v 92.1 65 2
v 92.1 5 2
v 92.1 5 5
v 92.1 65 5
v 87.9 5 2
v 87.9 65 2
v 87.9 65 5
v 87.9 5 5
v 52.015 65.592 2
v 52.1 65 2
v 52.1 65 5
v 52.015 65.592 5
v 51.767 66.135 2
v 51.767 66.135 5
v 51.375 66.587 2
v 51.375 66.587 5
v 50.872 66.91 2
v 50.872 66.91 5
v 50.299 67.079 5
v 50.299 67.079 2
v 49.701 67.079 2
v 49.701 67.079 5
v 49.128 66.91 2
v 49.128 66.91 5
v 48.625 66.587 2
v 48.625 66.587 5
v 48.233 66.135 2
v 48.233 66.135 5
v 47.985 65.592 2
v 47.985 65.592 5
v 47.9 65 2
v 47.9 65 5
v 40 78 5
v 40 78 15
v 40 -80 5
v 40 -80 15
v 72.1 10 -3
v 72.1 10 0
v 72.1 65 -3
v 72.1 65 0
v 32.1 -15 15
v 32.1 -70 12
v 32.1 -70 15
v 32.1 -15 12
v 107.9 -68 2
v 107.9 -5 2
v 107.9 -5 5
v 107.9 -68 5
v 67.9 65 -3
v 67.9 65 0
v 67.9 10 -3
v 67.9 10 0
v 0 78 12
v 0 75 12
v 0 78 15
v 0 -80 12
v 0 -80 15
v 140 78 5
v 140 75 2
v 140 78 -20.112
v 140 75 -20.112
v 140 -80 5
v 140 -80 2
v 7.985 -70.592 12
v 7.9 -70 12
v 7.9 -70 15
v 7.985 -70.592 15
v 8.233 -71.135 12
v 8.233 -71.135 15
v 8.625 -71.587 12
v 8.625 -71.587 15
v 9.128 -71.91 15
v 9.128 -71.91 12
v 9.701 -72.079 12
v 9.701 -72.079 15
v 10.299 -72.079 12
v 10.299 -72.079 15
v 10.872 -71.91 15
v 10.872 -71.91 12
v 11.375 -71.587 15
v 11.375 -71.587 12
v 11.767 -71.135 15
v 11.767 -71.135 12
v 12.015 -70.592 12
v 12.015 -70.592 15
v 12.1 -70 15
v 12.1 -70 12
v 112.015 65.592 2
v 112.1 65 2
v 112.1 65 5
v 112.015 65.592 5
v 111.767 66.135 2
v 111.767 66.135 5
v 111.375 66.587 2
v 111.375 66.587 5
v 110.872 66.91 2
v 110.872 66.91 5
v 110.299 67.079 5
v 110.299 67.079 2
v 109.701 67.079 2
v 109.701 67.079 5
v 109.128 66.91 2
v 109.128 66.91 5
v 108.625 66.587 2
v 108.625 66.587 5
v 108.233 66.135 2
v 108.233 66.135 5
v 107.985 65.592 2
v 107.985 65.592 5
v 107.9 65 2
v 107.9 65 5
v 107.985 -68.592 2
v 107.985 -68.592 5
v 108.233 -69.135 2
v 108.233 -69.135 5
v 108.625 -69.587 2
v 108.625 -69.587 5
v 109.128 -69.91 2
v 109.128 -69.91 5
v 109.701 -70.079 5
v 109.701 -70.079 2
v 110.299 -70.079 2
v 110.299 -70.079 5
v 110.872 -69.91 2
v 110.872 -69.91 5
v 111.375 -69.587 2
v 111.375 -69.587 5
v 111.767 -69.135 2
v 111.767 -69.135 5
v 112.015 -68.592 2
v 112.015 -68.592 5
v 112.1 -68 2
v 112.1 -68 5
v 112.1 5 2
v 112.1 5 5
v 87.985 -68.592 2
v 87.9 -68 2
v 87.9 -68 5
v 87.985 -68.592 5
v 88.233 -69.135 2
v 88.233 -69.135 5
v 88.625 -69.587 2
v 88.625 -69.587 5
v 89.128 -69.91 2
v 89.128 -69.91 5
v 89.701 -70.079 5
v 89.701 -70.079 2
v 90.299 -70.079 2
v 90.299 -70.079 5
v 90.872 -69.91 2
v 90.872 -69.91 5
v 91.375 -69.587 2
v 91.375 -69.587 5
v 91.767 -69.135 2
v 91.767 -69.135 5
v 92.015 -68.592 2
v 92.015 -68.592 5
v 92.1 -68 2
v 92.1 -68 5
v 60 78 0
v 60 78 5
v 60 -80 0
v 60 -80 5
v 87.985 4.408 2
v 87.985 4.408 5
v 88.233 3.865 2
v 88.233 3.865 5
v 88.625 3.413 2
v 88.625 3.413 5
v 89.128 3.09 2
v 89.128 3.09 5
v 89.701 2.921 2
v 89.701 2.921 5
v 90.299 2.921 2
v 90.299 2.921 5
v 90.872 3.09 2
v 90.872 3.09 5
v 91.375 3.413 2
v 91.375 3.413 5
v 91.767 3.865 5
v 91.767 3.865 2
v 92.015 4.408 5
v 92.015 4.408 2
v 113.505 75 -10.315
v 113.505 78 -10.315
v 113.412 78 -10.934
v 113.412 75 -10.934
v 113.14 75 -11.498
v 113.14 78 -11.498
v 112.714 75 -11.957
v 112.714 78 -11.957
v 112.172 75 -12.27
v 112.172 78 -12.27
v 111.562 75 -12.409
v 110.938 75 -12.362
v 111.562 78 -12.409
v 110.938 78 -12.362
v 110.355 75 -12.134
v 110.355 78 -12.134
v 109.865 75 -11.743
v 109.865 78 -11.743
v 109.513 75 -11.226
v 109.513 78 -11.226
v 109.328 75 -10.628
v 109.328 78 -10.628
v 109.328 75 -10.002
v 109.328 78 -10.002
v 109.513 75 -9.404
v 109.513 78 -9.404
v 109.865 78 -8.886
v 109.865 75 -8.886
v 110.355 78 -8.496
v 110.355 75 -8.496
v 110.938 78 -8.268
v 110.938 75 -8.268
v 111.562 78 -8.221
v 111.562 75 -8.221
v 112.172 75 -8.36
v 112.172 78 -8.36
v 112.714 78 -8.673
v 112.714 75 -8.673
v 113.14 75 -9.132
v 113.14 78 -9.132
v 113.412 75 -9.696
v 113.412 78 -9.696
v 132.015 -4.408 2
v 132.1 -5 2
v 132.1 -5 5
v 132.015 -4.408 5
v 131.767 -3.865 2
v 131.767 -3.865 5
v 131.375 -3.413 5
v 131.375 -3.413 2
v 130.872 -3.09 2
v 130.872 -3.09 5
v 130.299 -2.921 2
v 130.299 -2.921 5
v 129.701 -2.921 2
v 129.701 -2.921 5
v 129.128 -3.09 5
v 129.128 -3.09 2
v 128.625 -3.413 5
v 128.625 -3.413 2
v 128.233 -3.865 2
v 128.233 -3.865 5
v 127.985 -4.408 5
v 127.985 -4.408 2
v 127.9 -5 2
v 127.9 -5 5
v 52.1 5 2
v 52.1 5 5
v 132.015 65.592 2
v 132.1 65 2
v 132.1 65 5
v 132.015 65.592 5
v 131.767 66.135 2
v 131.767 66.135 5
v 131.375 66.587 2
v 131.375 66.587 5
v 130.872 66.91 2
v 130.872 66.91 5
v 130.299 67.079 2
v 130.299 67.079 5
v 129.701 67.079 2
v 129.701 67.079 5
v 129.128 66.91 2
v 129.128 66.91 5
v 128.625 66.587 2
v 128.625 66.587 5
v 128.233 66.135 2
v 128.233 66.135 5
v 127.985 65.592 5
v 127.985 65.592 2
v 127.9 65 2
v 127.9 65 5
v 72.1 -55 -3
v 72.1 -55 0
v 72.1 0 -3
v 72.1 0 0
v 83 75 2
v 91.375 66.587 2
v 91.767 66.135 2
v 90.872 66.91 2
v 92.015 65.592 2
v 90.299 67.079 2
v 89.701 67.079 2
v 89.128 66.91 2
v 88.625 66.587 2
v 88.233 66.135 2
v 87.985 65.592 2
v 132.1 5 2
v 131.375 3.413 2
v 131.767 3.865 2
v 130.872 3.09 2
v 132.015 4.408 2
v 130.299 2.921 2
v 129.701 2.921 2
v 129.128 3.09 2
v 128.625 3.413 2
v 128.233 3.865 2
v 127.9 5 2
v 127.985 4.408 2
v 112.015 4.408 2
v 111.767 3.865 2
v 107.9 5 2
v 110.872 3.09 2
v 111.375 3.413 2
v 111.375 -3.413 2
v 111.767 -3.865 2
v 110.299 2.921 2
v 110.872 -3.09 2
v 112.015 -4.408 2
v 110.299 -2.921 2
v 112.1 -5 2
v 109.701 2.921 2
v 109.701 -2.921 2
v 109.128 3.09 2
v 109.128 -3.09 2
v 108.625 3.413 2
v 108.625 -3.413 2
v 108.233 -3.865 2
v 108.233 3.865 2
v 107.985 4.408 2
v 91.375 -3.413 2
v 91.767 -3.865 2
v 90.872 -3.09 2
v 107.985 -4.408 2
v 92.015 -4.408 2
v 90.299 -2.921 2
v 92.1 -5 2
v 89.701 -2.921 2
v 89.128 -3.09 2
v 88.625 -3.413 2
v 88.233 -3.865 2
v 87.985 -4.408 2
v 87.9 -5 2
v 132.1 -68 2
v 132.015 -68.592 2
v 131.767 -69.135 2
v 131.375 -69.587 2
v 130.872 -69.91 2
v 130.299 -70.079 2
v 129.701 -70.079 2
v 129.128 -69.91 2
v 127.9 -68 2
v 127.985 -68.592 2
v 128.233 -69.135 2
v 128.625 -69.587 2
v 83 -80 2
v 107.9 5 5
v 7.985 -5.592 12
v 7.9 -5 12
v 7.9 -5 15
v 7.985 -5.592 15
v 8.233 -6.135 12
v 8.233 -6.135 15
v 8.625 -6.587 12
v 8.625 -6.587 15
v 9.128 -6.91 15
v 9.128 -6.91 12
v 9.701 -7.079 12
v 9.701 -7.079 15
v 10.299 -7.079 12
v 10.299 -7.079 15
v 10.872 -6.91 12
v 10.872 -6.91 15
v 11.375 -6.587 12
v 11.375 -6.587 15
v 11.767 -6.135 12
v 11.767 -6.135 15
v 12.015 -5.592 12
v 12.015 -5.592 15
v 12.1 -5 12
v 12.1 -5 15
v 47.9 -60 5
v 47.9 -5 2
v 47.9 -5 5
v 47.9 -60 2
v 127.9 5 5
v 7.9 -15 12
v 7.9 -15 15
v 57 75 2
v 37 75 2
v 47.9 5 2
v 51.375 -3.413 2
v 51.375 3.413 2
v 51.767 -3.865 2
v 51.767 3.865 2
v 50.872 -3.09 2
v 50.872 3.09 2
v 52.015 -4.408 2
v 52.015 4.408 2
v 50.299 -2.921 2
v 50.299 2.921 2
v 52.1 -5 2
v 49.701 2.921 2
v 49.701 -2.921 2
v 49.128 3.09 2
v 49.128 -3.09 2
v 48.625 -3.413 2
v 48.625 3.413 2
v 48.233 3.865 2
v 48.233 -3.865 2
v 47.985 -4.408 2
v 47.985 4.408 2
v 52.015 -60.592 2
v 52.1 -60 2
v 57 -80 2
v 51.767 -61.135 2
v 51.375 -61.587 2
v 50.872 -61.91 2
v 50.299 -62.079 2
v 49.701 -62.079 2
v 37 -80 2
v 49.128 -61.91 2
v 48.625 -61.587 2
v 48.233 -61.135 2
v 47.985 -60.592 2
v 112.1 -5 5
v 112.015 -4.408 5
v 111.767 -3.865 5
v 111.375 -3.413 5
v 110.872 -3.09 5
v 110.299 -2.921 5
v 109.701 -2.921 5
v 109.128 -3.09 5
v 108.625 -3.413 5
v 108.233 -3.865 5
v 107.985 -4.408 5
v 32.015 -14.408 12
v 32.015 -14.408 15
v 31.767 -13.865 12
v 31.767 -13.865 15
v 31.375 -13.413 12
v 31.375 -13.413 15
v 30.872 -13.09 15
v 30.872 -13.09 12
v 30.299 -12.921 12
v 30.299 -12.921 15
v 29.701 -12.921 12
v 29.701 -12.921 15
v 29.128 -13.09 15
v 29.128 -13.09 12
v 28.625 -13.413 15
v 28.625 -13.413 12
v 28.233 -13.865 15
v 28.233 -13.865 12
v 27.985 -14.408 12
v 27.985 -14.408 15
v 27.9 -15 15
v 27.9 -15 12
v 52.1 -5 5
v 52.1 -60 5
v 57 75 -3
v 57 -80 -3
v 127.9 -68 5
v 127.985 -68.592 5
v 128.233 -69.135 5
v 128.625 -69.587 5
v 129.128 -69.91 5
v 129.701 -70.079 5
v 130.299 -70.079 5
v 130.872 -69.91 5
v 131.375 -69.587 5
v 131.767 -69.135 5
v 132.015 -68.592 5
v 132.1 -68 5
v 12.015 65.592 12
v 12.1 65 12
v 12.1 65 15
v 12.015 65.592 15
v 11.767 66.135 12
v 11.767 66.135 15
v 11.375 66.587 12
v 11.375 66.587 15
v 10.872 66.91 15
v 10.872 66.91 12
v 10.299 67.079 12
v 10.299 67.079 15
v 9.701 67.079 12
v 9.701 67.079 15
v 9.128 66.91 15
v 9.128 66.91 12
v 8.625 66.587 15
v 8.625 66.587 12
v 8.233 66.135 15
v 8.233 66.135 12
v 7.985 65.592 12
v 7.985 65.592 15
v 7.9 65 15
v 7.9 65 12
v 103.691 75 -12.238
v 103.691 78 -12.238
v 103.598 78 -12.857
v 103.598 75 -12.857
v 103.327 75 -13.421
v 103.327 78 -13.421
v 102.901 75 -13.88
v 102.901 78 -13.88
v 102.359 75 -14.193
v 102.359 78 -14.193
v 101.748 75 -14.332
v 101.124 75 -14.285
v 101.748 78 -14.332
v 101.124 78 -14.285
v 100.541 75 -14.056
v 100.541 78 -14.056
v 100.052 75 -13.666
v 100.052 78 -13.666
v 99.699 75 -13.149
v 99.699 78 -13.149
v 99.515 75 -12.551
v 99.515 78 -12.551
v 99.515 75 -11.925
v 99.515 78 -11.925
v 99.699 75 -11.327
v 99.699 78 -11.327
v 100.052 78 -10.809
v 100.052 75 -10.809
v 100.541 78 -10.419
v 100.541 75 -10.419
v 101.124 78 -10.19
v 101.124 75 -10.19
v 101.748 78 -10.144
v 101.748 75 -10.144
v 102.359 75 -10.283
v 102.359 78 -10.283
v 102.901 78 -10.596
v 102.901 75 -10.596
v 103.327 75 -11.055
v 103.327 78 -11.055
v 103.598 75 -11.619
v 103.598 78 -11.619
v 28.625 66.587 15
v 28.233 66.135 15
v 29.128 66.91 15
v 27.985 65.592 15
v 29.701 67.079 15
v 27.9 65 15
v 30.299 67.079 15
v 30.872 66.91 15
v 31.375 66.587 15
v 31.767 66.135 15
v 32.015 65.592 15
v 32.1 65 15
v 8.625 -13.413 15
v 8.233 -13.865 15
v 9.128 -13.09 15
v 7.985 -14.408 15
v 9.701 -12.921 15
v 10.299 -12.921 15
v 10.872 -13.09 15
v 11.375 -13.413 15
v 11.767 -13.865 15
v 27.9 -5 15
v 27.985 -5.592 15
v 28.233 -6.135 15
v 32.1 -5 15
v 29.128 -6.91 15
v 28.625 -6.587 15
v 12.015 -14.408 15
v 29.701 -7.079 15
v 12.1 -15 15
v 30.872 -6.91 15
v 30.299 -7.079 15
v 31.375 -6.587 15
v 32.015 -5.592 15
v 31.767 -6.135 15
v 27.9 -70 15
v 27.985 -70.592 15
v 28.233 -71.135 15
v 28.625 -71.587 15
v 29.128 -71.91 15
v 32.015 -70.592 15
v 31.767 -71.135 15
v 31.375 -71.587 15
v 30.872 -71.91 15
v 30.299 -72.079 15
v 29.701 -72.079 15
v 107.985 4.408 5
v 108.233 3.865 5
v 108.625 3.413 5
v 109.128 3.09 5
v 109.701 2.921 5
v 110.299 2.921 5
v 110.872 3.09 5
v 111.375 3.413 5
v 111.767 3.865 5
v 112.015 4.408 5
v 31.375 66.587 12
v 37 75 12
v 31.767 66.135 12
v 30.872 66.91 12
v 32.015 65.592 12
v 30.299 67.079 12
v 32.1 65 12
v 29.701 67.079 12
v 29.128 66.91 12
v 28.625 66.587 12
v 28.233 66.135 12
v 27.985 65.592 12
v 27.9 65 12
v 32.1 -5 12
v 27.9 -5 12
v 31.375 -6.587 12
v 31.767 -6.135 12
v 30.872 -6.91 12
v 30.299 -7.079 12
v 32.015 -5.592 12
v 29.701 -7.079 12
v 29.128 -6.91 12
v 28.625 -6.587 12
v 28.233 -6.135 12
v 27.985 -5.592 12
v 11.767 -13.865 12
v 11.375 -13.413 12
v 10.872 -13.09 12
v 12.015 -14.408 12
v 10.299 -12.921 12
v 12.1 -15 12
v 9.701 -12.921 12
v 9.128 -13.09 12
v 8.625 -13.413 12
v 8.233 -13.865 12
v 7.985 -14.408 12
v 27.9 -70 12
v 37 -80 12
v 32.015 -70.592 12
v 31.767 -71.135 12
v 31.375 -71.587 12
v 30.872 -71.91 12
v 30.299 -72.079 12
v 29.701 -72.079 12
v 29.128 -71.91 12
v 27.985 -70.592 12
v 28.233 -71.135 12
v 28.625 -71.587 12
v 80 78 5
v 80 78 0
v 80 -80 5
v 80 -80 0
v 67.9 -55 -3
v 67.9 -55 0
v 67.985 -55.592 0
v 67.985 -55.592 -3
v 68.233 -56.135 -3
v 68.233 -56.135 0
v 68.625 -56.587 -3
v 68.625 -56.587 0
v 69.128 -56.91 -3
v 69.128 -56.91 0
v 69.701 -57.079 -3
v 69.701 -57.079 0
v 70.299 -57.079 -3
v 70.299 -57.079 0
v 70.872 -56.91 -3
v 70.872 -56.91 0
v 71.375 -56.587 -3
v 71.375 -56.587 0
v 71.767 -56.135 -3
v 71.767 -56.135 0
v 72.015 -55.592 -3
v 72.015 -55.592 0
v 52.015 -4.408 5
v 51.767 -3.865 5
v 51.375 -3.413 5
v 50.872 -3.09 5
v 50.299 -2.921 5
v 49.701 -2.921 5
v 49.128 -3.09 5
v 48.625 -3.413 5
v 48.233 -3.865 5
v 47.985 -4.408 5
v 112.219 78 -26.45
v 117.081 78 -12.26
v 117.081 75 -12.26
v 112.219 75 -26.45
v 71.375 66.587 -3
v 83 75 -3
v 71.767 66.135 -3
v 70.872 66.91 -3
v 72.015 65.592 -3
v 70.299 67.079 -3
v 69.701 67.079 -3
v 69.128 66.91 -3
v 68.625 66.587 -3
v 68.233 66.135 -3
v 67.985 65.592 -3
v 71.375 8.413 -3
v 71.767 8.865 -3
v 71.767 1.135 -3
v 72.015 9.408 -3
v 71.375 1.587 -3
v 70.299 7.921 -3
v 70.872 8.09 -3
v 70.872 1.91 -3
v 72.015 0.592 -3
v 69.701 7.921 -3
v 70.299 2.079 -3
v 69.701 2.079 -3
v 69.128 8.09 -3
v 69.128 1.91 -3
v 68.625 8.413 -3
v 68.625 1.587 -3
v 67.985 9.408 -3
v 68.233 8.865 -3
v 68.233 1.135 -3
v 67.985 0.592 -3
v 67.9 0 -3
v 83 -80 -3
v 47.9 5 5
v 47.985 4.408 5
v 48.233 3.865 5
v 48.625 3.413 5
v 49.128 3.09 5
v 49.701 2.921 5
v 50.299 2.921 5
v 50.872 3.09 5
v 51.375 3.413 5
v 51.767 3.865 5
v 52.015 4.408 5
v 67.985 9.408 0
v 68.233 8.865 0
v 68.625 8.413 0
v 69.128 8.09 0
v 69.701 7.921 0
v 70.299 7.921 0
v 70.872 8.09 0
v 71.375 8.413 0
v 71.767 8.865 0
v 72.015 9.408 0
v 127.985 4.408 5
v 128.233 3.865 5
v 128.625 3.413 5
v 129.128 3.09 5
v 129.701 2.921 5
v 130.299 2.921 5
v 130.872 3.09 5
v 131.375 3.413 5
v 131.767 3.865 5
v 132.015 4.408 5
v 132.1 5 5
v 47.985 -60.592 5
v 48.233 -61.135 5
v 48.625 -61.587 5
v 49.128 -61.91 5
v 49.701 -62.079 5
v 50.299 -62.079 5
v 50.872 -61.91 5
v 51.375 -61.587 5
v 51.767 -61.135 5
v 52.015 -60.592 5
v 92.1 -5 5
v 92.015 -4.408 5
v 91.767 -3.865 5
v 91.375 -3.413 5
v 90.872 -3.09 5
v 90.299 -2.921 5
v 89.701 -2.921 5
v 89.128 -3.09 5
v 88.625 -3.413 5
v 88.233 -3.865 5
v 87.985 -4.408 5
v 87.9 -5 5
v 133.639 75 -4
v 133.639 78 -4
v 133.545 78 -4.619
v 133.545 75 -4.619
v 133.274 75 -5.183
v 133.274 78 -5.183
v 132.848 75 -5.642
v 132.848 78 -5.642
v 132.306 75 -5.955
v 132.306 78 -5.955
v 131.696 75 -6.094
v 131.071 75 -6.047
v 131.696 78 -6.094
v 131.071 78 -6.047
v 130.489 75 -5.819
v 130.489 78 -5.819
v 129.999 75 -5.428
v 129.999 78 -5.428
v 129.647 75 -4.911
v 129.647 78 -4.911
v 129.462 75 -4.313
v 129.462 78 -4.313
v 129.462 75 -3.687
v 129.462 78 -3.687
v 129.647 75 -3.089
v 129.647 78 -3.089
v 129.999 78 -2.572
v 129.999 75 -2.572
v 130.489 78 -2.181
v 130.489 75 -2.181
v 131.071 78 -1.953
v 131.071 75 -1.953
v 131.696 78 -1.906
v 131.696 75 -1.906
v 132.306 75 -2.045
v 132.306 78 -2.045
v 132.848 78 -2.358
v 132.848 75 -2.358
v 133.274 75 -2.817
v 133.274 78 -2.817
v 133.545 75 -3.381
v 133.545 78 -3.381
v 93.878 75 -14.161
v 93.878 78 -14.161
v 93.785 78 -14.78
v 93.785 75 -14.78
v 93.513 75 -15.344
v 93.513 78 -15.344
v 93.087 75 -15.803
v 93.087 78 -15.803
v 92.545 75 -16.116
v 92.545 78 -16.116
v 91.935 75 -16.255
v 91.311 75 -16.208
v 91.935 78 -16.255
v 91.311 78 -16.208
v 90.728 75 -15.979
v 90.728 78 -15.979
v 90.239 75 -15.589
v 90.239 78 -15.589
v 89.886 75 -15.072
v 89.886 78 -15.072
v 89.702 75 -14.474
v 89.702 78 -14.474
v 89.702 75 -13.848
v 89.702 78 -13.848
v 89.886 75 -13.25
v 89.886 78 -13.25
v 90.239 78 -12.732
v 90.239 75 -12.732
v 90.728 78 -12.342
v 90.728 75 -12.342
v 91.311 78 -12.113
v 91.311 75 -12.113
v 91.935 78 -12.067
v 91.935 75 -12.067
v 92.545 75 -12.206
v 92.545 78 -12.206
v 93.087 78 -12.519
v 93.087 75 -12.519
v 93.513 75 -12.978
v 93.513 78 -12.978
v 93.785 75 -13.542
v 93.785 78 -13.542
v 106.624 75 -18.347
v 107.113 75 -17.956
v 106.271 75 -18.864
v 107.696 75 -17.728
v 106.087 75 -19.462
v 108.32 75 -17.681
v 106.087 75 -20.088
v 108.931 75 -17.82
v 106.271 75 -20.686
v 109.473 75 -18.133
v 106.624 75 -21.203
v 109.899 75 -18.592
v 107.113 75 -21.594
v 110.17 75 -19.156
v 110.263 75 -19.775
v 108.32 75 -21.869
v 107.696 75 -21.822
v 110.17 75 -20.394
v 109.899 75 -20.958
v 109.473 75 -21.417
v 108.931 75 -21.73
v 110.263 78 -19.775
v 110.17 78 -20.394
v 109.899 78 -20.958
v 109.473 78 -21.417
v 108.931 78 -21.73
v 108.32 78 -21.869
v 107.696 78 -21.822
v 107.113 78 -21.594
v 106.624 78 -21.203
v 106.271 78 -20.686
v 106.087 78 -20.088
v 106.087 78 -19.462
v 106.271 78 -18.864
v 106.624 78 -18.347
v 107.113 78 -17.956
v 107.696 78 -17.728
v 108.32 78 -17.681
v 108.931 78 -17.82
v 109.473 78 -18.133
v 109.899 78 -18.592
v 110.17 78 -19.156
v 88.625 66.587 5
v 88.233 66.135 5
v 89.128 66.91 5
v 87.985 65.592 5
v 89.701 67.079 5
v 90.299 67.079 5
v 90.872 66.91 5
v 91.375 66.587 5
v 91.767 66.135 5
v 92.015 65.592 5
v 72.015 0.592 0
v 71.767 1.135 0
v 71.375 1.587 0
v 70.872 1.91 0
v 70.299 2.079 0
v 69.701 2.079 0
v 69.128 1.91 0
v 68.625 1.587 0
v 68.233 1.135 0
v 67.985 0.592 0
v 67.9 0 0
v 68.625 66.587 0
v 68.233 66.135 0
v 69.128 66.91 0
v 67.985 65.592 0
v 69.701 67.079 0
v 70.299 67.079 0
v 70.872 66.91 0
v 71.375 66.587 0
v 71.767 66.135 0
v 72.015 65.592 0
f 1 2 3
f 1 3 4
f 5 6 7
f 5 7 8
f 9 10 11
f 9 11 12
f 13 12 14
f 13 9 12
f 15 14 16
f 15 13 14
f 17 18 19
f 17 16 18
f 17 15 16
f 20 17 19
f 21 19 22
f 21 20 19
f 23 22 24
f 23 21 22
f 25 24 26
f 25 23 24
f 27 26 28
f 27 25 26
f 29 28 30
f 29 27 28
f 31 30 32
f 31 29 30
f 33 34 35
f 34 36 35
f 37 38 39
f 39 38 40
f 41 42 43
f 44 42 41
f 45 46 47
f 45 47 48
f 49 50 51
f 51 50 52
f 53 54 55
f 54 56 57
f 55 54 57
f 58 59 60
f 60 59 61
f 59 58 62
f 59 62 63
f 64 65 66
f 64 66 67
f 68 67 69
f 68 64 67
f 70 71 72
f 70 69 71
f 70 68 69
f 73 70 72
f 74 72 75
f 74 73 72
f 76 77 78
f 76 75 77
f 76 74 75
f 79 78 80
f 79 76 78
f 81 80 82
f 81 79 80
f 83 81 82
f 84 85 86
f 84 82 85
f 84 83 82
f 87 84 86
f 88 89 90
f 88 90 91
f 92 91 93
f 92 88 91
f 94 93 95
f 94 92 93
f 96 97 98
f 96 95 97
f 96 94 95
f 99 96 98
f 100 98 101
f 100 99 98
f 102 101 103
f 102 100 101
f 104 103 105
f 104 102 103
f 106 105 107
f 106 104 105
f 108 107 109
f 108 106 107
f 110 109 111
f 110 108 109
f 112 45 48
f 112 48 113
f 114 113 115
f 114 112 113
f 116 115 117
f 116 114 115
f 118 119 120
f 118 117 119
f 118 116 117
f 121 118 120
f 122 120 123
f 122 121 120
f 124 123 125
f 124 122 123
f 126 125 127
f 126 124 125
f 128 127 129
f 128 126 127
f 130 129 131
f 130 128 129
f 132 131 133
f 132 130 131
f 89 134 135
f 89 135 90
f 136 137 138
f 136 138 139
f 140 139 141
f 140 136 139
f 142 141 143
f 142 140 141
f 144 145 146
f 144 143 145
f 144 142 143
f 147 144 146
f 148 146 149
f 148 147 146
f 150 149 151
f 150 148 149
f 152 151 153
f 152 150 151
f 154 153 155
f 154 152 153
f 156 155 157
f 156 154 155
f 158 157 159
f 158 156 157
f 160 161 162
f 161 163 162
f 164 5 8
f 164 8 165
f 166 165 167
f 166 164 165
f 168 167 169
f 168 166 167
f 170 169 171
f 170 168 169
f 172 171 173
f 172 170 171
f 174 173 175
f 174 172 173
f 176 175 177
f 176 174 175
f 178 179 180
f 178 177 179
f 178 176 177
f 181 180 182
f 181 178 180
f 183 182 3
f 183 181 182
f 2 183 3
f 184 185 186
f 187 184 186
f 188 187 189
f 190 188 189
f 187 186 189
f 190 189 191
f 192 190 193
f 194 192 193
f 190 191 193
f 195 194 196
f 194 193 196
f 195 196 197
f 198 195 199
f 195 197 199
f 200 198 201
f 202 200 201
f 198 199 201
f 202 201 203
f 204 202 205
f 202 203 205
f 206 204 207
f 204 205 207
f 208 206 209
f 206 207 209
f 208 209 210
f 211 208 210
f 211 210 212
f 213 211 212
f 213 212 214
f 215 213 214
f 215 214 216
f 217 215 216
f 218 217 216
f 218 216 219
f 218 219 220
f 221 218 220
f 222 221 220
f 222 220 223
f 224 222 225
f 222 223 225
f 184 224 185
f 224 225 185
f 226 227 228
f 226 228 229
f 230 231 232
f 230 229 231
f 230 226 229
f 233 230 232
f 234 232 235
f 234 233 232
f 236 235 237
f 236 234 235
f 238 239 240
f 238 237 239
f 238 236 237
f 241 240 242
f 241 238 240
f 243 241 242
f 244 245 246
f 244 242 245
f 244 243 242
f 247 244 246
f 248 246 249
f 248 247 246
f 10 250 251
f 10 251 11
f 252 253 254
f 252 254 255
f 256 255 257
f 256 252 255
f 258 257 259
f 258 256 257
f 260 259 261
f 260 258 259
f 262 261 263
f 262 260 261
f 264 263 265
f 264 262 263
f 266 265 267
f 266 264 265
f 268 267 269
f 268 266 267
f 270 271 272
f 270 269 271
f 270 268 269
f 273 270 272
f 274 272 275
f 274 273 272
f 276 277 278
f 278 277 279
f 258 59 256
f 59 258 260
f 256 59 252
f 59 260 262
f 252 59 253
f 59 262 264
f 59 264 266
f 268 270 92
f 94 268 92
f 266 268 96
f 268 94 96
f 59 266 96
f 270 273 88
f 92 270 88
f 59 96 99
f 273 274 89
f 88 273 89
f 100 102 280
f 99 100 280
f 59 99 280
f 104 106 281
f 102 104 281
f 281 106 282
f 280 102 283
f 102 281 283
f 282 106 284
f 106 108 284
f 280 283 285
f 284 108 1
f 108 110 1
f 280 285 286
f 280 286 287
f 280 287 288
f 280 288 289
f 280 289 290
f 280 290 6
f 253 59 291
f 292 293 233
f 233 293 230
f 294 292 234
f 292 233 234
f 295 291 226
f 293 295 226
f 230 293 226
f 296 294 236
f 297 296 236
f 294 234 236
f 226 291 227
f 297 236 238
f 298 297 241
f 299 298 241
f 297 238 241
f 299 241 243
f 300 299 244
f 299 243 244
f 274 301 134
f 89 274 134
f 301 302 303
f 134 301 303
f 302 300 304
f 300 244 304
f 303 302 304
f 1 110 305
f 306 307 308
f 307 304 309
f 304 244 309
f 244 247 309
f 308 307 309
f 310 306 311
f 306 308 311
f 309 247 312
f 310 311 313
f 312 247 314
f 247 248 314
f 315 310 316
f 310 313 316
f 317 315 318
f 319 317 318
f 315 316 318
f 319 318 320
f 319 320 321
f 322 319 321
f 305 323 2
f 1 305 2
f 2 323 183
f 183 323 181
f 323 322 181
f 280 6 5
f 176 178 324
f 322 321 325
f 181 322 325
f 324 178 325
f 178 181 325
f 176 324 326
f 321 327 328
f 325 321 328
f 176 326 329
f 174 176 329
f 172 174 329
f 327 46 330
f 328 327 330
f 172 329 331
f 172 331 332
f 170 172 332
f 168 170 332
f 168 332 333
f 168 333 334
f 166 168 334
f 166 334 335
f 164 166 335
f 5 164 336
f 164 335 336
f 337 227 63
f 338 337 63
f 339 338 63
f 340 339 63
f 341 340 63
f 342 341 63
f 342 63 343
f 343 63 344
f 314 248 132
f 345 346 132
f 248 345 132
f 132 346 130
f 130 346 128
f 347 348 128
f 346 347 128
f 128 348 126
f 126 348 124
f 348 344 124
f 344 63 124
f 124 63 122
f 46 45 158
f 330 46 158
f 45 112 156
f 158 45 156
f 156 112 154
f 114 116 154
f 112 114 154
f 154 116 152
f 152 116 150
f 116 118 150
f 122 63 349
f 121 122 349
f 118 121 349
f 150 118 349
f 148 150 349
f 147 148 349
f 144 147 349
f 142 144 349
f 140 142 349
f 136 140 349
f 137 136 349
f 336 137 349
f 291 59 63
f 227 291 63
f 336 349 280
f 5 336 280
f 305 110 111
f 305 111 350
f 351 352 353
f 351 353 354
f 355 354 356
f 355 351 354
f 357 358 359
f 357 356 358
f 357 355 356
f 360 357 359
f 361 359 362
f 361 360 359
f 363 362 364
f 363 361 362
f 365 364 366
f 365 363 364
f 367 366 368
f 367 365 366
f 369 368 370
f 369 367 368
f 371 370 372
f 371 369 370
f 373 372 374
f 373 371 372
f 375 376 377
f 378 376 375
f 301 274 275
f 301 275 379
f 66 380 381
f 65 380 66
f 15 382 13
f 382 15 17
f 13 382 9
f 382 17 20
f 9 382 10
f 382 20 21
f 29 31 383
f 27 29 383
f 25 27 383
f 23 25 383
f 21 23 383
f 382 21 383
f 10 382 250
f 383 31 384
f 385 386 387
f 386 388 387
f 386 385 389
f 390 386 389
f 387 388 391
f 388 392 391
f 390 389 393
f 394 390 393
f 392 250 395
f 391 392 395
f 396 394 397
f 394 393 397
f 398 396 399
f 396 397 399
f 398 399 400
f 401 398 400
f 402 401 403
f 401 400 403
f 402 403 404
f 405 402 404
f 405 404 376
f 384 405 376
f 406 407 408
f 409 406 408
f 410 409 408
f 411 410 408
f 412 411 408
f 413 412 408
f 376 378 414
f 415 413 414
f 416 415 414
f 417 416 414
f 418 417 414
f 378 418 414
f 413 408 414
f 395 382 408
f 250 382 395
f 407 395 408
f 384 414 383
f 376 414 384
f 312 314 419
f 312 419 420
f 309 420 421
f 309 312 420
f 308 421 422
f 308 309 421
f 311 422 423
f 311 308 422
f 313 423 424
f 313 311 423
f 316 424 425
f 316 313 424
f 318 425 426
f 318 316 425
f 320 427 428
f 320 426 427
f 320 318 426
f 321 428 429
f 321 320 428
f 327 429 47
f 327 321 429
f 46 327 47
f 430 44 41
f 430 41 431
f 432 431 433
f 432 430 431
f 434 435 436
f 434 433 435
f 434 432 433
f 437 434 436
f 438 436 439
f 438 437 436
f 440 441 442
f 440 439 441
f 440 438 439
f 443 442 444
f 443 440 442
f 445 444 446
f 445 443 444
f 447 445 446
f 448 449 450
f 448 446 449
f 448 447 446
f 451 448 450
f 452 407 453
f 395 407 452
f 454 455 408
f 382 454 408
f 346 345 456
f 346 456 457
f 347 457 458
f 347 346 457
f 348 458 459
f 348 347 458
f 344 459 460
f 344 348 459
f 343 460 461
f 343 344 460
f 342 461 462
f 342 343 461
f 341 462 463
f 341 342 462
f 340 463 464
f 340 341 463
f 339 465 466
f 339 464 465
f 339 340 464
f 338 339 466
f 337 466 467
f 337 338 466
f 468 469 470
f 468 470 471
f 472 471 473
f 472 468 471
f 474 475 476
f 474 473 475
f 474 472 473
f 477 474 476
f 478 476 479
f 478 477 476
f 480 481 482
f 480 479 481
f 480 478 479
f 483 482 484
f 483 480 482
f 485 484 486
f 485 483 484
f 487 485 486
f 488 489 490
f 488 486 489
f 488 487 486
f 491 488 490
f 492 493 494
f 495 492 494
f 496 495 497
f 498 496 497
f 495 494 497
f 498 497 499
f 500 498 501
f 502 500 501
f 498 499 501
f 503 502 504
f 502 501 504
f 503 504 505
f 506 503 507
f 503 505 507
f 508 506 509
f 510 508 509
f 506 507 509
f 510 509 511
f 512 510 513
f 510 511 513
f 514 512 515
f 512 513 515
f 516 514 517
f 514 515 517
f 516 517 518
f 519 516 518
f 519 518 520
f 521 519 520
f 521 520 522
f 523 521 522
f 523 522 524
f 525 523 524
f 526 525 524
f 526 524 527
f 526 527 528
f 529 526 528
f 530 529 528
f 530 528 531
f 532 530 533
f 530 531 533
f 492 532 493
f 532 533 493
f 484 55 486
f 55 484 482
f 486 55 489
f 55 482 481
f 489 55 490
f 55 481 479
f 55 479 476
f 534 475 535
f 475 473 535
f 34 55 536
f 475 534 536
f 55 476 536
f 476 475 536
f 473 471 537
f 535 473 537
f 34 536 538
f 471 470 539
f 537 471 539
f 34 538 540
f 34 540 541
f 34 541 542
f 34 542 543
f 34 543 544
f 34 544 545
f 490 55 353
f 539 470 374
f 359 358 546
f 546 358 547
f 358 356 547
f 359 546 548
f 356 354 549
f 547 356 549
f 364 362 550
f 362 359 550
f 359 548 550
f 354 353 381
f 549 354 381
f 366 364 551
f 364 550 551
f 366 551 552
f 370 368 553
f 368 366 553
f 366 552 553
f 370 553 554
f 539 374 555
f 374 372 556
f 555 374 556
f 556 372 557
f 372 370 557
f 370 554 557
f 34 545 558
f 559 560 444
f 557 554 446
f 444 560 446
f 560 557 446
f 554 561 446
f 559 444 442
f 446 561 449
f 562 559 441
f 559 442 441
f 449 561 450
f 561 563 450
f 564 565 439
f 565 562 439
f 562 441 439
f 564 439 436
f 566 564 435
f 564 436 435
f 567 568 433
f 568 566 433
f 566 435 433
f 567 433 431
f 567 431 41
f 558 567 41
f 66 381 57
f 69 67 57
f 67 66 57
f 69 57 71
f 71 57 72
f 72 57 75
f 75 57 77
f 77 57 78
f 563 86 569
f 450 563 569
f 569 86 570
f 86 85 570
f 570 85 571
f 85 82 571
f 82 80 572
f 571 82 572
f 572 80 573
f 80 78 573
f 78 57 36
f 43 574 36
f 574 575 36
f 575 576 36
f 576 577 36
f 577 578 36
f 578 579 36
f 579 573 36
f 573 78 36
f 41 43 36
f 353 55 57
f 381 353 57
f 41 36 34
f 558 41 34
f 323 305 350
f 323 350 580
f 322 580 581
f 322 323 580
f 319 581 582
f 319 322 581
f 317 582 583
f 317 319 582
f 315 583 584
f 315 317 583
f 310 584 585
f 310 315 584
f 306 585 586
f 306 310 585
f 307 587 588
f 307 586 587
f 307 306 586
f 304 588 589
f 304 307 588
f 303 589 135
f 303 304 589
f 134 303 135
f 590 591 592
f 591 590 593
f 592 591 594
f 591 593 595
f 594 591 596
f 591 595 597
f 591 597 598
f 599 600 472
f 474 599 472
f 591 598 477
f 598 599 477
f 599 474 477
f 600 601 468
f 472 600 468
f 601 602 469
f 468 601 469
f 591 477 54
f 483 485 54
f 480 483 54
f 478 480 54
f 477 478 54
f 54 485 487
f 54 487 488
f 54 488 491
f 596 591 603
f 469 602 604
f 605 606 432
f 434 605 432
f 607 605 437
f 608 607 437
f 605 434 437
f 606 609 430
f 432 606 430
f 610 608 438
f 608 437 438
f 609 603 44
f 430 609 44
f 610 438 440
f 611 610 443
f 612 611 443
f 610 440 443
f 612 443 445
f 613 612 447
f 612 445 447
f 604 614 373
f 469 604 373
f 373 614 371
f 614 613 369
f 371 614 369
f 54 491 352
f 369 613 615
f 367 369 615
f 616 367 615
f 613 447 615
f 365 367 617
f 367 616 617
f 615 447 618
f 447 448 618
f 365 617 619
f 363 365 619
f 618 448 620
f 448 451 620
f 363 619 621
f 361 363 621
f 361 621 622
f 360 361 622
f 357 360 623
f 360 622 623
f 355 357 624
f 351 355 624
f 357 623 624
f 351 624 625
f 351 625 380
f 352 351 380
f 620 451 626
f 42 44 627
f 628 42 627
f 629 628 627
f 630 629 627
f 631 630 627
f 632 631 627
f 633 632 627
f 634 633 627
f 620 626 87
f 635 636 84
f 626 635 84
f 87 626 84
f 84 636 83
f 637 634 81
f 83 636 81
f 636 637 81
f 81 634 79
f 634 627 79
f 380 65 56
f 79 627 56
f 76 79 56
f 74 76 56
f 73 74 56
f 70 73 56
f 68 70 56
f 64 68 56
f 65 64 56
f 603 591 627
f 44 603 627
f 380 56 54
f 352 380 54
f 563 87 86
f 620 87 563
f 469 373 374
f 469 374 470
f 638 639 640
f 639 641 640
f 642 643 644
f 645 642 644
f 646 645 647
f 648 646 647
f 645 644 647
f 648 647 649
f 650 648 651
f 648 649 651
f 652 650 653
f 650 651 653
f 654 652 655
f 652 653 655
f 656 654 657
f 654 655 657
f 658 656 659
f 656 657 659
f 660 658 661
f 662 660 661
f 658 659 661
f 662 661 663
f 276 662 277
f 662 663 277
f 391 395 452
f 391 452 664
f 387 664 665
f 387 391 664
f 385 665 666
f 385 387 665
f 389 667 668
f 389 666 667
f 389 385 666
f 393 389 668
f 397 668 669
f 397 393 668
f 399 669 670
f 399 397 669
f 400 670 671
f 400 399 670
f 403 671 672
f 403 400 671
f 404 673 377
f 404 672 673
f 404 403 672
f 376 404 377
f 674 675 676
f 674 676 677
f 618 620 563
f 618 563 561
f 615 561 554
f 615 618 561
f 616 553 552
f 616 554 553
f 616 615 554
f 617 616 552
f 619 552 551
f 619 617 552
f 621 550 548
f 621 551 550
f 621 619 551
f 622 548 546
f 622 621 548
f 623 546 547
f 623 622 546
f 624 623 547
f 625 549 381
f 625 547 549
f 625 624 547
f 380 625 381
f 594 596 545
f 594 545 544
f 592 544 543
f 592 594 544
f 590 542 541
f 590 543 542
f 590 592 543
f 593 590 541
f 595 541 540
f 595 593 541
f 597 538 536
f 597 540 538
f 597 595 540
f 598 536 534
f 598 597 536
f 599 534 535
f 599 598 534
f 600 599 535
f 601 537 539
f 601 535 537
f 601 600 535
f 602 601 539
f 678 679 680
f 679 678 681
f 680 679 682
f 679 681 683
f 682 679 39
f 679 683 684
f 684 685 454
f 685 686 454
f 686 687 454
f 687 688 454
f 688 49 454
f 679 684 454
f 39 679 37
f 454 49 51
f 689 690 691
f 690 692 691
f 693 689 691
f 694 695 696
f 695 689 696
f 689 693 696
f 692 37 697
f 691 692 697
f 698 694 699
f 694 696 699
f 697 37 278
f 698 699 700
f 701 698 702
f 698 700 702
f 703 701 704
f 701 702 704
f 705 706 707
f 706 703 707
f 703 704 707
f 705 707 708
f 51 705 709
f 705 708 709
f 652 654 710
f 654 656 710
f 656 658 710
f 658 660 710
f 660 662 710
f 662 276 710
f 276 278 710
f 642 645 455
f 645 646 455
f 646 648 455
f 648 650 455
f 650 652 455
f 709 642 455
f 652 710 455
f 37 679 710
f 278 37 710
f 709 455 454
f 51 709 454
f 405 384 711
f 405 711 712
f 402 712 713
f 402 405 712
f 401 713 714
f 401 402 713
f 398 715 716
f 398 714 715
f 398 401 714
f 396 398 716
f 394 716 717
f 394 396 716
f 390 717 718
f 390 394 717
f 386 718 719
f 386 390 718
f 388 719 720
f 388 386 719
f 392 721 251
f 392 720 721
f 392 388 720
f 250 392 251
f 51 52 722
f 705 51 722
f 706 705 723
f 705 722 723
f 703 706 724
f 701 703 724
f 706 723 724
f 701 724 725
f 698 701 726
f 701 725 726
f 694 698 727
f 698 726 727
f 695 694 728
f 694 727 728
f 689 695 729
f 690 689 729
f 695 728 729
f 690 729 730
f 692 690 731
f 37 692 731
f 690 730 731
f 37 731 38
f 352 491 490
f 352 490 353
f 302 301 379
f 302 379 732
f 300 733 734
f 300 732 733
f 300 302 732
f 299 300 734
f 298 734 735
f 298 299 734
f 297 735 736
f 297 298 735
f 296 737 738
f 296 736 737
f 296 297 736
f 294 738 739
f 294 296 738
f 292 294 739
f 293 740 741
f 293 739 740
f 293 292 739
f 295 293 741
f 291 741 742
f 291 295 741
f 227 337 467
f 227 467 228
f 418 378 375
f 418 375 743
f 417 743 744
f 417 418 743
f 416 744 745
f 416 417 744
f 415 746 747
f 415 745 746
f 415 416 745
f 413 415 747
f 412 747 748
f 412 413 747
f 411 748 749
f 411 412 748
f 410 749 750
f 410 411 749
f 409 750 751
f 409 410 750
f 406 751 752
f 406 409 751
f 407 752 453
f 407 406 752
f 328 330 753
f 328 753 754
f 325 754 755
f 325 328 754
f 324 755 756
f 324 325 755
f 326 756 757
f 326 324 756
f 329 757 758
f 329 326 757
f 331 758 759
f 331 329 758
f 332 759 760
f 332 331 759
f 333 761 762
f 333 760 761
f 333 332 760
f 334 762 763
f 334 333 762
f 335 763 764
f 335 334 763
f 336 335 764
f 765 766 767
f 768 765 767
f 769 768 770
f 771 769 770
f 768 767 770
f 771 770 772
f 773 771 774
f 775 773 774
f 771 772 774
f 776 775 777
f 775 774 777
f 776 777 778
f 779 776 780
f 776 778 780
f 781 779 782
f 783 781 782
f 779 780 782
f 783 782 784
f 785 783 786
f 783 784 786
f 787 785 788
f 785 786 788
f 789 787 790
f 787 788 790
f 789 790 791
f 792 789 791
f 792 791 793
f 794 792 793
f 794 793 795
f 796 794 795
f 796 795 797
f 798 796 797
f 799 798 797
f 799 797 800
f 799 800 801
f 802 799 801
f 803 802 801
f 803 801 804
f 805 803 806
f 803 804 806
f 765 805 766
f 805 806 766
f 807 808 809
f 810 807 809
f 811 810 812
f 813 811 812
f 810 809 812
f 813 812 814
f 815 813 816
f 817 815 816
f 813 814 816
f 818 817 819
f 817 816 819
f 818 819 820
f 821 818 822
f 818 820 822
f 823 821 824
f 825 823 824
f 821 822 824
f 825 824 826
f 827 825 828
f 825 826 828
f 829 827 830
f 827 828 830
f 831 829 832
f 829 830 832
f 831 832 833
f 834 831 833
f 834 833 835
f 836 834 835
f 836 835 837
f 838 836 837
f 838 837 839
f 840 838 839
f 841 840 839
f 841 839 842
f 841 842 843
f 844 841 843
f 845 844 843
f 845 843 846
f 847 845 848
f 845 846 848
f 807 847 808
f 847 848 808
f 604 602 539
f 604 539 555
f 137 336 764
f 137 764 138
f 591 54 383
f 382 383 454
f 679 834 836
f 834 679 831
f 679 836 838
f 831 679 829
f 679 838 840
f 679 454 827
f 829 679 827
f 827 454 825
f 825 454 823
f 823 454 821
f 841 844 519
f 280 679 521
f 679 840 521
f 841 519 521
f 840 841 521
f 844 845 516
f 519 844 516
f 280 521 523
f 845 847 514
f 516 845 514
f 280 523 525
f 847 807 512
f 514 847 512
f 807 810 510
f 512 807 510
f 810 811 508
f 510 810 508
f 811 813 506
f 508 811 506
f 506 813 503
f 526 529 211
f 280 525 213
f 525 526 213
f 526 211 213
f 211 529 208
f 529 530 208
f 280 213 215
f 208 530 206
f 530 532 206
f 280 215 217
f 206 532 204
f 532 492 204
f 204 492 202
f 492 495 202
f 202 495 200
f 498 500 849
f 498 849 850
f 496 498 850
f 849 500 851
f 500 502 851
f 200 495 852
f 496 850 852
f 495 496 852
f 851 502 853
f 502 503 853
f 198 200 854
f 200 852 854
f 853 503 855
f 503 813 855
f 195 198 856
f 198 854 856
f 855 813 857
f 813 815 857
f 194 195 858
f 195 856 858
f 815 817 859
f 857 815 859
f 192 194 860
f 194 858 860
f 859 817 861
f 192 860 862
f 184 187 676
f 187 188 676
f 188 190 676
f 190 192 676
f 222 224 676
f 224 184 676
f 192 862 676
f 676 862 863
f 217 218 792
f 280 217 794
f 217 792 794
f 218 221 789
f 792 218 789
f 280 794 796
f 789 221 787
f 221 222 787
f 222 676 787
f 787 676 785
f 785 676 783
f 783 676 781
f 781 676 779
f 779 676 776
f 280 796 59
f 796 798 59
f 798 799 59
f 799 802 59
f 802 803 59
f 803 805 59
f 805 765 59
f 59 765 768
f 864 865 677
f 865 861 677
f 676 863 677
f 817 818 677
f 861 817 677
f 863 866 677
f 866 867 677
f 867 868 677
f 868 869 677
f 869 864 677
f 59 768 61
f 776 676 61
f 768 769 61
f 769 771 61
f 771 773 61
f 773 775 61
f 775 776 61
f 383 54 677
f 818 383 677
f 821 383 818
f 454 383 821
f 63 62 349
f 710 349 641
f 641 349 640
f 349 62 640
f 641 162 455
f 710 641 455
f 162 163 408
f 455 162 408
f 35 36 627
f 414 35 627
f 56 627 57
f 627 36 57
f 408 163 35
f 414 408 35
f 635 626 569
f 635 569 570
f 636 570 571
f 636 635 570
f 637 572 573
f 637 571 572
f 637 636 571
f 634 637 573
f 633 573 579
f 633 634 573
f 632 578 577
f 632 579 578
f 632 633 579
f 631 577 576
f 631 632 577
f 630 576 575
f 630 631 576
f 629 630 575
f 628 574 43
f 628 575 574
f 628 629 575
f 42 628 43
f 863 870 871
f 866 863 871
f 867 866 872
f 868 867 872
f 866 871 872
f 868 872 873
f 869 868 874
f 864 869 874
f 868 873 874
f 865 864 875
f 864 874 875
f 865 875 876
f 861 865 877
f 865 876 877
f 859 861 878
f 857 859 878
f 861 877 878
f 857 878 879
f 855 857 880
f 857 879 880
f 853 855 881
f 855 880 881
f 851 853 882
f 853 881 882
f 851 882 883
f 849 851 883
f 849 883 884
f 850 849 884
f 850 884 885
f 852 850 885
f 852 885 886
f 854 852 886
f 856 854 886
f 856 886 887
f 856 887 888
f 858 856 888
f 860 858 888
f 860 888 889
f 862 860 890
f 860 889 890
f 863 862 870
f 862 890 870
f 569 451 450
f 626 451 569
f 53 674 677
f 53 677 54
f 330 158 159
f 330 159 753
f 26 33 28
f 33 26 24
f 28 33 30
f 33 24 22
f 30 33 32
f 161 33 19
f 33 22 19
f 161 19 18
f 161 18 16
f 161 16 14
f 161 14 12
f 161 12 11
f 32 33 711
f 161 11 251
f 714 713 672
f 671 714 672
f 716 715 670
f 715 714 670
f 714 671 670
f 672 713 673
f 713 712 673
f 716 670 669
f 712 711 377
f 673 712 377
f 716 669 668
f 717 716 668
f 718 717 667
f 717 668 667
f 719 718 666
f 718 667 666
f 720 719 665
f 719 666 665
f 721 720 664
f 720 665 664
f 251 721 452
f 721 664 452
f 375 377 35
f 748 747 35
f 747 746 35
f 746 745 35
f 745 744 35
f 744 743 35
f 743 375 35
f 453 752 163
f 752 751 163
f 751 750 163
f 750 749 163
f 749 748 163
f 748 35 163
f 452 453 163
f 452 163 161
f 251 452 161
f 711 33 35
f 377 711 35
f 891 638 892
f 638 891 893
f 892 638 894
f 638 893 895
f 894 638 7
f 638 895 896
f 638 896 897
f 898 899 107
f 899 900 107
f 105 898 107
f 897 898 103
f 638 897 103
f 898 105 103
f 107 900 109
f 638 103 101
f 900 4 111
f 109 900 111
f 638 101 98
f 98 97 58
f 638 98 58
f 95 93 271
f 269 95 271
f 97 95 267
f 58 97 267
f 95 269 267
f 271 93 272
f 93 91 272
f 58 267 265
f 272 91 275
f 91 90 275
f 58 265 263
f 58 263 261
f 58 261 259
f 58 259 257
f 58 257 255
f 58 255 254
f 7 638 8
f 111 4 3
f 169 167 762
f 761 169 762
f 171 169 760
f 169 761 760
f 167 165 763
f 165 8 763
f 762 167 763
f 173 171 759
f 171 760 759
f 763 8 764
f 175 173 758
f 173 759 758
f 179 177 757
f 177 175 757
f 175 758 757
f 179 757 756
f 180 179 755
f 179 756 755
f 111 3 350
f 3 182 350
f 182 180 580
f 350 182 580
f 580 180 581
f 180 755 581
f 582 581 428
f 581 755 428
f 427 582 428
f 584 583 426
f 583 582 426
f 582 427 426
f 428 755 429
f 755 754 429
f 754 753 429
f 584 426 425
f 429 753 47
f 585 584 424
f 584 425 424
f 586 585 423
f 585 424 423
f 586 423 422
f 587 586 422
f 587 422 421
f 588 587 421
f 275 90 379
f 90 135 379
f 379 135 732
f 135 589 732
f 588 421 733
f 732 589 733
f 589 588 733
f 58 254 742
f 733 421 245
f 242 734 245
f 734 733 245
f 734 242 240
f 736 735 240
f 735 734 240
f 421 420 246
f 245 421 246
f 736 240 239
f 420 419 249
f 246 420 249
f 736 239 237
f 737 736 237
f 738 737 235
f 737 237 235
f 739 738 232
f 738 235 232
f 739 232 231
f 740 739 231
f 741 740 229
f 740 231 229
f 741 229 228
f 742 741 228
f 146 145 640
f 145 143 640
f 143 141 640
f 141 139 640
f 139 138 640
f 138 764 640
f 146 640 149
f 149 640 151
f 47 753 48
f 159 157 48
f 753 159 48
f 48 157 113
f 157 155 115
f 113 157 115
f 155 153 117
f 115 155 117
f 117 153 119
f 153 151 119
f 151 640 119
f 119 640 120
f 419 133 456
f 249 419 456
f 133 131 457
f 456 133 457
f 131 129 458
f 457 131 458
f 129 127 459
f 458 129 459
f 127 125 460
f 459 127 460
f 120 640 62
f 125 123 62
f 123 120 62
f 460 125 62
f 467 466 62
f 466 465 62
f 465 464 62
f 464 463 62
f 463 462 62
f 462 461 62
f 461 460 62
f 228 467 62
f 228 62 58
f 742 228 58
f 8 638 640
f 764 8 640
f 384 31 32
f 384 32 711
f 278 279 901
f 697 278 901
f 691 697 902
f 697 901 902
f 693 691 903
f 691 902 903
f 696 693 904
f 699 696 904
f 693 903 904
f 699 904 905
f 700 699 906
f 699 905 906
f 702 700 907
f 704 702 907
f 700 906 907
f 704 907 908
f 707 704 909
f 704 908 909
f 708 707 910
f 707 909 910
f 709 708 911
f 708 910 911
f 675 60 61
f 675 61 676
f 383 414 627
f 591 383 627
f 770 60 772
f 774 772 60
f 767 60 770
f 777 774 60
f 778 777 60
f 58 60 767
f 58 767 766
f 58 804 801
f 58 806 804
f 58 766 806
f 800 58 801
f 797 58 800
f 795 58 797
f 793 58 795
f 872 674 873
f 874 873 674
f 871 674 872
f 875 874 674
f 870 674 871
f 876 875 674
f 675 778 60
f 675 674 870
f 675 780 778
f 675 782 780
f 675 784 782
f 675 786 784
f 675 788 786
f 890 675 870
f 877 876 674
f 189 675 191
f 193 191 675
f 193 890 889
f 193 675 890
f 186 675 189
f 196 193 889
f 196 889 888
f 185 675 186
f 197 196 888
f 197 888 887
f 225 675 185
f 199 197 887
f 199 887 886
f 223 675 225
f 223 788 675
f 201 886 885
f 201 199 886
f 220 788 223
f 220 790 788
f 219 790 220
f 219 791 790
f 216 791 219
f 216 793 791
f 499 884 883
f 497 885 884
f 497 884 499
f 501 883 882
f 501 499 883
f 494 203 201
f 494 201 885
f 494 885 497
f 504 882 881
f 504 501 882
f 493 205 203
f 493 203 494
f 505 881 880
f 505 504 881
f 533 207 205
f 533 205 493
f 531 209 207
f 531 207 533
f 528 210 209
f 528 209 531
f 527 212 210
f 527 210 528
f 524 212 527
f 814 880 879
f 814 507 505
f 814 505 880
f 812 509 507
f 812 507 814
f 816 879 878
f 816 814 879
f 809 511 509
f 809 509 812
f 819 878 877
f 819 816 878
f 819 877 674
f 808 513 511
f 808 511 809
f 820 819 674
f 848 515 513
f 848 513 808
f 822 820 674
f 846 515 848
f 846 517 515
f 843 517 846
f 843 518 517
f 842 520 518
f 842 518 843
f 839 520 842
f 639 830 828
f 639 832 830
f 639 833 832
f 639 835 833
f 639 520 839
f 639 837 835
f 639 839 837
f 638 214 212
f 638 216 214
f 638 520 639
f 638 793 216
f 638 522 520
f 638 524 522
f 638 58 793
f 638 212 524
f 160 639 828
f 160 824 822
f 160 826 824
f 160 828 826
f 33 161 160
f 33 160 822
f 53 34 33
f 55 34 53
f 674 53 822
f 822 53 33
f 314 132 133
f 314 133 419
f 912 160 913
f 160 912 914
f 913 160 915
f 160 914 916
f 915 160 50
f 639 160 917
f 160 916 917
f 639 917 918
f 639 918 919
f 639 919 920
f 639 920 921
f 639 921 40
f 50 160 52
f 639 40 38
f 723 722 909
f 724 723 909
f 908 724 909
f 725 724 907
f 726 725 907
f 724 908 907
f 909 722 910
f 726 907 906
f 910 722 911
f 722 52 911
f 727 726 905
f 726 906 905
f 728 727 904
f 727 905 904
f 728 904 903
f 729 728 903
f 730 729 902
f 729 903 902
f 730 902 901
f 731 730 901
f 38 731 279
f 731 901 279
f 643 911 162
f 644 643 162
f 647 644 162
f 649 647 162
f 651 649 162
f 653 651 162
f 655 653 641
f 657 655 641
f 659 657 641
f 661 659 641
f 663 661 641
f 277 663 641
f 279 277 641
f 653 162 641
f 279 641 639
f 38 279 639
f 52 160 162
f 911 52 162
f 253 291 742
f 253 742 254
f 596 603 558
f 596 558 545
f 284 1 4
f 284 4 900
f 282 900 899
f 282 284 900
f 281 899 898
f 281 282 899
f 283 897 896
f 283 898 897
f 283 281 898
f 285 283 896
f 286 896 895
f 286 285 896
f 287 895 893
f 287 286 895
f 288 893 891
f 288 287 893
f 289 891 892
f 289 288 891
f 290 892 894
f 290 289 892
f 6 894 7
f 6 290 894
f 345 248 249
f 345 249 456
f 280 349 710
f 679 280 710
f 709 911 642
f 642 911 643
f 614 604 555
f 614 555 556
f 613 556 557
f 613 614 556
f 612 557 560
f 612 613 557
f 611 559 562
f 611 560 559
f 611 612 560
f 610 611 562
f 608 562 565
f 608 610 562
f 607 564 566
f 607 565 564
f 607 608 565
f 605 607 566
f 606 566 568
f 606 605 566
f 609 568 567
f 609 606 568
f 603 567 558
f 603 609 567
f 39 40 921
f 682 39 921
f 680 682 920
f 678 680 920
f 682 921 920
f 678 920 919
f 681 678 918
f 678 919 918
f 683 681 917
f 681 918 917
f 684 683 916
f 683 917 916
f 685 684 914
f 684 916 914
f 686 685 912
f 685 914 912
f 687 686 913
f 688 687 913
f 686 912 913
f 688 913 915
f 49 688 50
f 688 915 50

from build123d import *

# Parameters (mm, degrees)
PAD024_DEPTH         = 80
PAD024_DEPTH_BACK    = 78
SKETCH039_R          = 2.1
PAD025_DEPTH         = 3
POCKET015_DEPTH      = 26.4508304953
POCKET015_DEPTH_BACK = 15.001


with BuildPart() as part:
    # Sketch038 → Pad024 (new body, two sides)
    with BuildSketch(Plane.XZ) as pad024_sk:
        Polygon((0, 15), (40, 15), (40, 5), (60, 5), (60, 0), (80, 0), (80, 5), (140, 5), (140, 2), (83, 2), (83, -3), (57, -3), (57, 2), (37, 2), (37, 12), (0, 12), align=None)
    extrude(amount=PAD024_DEPTH)
    extrude(pad024_sk.sketch, amount=-PAD024_DEPTH_BACK)

    # Sketch039 (on Face17 of Pad024) → Pad025 (join)
    with BuildSketch(Plane(origin=(0, 78, 0), x_dir=(1, 0, 0), z_dir=(0, 1, 0))):
        Polygon((140, -5), (140, 20.112497453), (117.0808832189, 12.2596635501), (112.2188710769, 26.4498304953), (0, -12), (0, -15), (40, -15), (40, -5), (60, -5), (60, 0), (80, 0), (80, -5), align=None)
        with Locations((131.5386824304, 4)):
            Circle(SKETCH039_R, mode=Mode.SUBTRACT)
        with Locations((111.4048164409, 10.3148586933)):
            Circle(SKETCH039_R, mode=Mode.SUBTRACT)
        with Locations((108.1634750128, 19.7749699901)):
            Circle(SKETCH039_R, mode=Mode.SUBTRACT)
        with Locations((91.7780816016, 14.1608019521)):
            Circle(SKETCH039_R, mode=Mode.SUBTRACT)
        with Locations((101.5914490212, 12.2378303227)):
            Circle(SKETCH039_R, mode=Mode.SUBTRACT)
    extrude(amount=-PAD025_DEPTH)

    # Sketch048 → Pocket015 (cut, two sides)
    with BuildSketch(Plane.XY) as pocket015_sk:
        with BuildLine():
            ThreePointArc((7.9, -5), (10, -7.1), (12.1, -5))
            Line((12.1, -5), (12.1, 65))
            ThreePointArc((12.1, 65), (10, 67.1), (7.9, 65))
            Line((7.9, 65), (7.9, -5))
        make_face()
        with BuildLine():
            ThreePointArc((12.1, -15), (10, -12.9), (7.9, -15))
            Line((7.9, -15), (7.9, -70))
            ThreePointArc((7.9, -70), (10, -72.1), (12.1, -70))
            Line((12.1, -70), (12.1, -15))
        make_face()
        with BuildLine():
            ThreePointArc((27.9, -70), (30, -72.1), (32.1, -70))
            Line((32.1, -70), (32.1, -15))
            ThreePointArc((32.1, -15), (30, -12.9), (27.9, -15))
            Line((27.9, -15), (27.9, -70))
        make_face()
        with BuildLine():
            ThreePointArc((52.1, -5), (50, -2.9), (47.9, -5))
            Line((47.9, -5), (47.9, -60))
            ThreePointArc((47.9, -60), (50, -62.1), (52.1, -60))
            Line((52.1, -60), (52.1, -5))
        make_face()
        with BuildLine():
            ThreePointArc((67.9, -55), (70, -57.1), (72.1, -55))
            Line((72.1, -55), (72.1, 0))
            ThreePointArc((72.1, 0), (70, 2.1), (67.9, 0))
            Line((67.9, 0), (67.9, -55))
        make_face()
        with BuildLine():
            ThreePointArc((87.9, -68), (90, -70.1), (92.1, -68))
            Line((92.1, -68), (92.1, -5))
            ThreePointArc((92.1, -5), (90, -2.9), (87.9, -5))
            Line((87.9, -5), (87.9, -68))
        make_face()
        with BuildLine():
            ThreePointArc((112.1, -5), (110, -2.9), (107.9, -5))
            Line((107.9, -5), (107.9, -68))
            ThreePointArc((107.9, -68), (110, -70.1), (112.1, -68))
            Line((112.1, -68), (112.1, -5))
        make_face()
        with BuildLine():
            ThreePointArc((127.9, -68), (130, -70.1), (132.1, -68))
            Line((132.1, -68), (132.1, -5))
            ThreePointArc((132.1, -5), (130, -2.9), (127.9, -5))
            Line((127.9, -5), (127.9, -68))
        make_face()
        with BuildLine():
            ThreePointArc((127.9, 5), (130, 2.9), (132.1, 5))
            Line((132.1, 5), (132.1, 65))
            ThreePointArc((132.1, 65), (130, 67.1), (127.9, 65))
            Line((127.9, 65), (127.9, 5))
        make_face()
        with BuildLine():
            ThreePointArc((112.1, 65), (110, 67.1), (107.9, 65))
            Line((107.9, 65), (107.9, 5))
            ThreePointArc((107.9, 5), (110, 2.9), (112.1, 5))
            Line((112.1, 5), (112.1, 65))
        make_face()
        with BuildLine():
            ThreePointArc((87.9, 5), (90, 2.9), (92.1, 5))
            Line((92.1, 5), (92.1, 65))
            ThreePointArc((92.1, 65), (90, 67.1), (87.9, 65))
            Line((87.9, 65), (87.9, 5))
        make_face()
        with BuildLine():
            ThreePointArc((67.9, 10), (70, 7.9), (72.1, 10))
            Line((72.1, 10), (72.1, 65))
            ThreePointArc((72.1, 65), (70, 67.1), (67.9, 65))
            Line((67.9, 65), (67.9, 10))
        make_face()
        with BuildLine():
            ThreePointArc((47.9, 5), (50, 2.9), (52.1, 5))
            Line((52.1, 5), (52.1, 65))
            ThreePointArc((52.1, 65), (50, 67.1), (47.9, 65))
            Line((47.9, 65), (47.9, 5))
        make_face()
        with BuildLine():
            ThreePointArc((27.9, -5), (30, -7.1), (32.1, -5))
            Line((32.1, -5), (32.1, 65))
            ThreePointArc((32.1, 65), (30, 67.1), (27.9, 65))
            Line((27.9, 65), (27.9, -5))
        make_face()
    extrude(amount=-POCKET015_DEPTH, mode=Mode.SUBTRACT)
    extrude(pocket015_sk.sketch, amount=POCKET015_DEPTH_BACK, mode=Mode.SUBTRACT)


solid = part.part
